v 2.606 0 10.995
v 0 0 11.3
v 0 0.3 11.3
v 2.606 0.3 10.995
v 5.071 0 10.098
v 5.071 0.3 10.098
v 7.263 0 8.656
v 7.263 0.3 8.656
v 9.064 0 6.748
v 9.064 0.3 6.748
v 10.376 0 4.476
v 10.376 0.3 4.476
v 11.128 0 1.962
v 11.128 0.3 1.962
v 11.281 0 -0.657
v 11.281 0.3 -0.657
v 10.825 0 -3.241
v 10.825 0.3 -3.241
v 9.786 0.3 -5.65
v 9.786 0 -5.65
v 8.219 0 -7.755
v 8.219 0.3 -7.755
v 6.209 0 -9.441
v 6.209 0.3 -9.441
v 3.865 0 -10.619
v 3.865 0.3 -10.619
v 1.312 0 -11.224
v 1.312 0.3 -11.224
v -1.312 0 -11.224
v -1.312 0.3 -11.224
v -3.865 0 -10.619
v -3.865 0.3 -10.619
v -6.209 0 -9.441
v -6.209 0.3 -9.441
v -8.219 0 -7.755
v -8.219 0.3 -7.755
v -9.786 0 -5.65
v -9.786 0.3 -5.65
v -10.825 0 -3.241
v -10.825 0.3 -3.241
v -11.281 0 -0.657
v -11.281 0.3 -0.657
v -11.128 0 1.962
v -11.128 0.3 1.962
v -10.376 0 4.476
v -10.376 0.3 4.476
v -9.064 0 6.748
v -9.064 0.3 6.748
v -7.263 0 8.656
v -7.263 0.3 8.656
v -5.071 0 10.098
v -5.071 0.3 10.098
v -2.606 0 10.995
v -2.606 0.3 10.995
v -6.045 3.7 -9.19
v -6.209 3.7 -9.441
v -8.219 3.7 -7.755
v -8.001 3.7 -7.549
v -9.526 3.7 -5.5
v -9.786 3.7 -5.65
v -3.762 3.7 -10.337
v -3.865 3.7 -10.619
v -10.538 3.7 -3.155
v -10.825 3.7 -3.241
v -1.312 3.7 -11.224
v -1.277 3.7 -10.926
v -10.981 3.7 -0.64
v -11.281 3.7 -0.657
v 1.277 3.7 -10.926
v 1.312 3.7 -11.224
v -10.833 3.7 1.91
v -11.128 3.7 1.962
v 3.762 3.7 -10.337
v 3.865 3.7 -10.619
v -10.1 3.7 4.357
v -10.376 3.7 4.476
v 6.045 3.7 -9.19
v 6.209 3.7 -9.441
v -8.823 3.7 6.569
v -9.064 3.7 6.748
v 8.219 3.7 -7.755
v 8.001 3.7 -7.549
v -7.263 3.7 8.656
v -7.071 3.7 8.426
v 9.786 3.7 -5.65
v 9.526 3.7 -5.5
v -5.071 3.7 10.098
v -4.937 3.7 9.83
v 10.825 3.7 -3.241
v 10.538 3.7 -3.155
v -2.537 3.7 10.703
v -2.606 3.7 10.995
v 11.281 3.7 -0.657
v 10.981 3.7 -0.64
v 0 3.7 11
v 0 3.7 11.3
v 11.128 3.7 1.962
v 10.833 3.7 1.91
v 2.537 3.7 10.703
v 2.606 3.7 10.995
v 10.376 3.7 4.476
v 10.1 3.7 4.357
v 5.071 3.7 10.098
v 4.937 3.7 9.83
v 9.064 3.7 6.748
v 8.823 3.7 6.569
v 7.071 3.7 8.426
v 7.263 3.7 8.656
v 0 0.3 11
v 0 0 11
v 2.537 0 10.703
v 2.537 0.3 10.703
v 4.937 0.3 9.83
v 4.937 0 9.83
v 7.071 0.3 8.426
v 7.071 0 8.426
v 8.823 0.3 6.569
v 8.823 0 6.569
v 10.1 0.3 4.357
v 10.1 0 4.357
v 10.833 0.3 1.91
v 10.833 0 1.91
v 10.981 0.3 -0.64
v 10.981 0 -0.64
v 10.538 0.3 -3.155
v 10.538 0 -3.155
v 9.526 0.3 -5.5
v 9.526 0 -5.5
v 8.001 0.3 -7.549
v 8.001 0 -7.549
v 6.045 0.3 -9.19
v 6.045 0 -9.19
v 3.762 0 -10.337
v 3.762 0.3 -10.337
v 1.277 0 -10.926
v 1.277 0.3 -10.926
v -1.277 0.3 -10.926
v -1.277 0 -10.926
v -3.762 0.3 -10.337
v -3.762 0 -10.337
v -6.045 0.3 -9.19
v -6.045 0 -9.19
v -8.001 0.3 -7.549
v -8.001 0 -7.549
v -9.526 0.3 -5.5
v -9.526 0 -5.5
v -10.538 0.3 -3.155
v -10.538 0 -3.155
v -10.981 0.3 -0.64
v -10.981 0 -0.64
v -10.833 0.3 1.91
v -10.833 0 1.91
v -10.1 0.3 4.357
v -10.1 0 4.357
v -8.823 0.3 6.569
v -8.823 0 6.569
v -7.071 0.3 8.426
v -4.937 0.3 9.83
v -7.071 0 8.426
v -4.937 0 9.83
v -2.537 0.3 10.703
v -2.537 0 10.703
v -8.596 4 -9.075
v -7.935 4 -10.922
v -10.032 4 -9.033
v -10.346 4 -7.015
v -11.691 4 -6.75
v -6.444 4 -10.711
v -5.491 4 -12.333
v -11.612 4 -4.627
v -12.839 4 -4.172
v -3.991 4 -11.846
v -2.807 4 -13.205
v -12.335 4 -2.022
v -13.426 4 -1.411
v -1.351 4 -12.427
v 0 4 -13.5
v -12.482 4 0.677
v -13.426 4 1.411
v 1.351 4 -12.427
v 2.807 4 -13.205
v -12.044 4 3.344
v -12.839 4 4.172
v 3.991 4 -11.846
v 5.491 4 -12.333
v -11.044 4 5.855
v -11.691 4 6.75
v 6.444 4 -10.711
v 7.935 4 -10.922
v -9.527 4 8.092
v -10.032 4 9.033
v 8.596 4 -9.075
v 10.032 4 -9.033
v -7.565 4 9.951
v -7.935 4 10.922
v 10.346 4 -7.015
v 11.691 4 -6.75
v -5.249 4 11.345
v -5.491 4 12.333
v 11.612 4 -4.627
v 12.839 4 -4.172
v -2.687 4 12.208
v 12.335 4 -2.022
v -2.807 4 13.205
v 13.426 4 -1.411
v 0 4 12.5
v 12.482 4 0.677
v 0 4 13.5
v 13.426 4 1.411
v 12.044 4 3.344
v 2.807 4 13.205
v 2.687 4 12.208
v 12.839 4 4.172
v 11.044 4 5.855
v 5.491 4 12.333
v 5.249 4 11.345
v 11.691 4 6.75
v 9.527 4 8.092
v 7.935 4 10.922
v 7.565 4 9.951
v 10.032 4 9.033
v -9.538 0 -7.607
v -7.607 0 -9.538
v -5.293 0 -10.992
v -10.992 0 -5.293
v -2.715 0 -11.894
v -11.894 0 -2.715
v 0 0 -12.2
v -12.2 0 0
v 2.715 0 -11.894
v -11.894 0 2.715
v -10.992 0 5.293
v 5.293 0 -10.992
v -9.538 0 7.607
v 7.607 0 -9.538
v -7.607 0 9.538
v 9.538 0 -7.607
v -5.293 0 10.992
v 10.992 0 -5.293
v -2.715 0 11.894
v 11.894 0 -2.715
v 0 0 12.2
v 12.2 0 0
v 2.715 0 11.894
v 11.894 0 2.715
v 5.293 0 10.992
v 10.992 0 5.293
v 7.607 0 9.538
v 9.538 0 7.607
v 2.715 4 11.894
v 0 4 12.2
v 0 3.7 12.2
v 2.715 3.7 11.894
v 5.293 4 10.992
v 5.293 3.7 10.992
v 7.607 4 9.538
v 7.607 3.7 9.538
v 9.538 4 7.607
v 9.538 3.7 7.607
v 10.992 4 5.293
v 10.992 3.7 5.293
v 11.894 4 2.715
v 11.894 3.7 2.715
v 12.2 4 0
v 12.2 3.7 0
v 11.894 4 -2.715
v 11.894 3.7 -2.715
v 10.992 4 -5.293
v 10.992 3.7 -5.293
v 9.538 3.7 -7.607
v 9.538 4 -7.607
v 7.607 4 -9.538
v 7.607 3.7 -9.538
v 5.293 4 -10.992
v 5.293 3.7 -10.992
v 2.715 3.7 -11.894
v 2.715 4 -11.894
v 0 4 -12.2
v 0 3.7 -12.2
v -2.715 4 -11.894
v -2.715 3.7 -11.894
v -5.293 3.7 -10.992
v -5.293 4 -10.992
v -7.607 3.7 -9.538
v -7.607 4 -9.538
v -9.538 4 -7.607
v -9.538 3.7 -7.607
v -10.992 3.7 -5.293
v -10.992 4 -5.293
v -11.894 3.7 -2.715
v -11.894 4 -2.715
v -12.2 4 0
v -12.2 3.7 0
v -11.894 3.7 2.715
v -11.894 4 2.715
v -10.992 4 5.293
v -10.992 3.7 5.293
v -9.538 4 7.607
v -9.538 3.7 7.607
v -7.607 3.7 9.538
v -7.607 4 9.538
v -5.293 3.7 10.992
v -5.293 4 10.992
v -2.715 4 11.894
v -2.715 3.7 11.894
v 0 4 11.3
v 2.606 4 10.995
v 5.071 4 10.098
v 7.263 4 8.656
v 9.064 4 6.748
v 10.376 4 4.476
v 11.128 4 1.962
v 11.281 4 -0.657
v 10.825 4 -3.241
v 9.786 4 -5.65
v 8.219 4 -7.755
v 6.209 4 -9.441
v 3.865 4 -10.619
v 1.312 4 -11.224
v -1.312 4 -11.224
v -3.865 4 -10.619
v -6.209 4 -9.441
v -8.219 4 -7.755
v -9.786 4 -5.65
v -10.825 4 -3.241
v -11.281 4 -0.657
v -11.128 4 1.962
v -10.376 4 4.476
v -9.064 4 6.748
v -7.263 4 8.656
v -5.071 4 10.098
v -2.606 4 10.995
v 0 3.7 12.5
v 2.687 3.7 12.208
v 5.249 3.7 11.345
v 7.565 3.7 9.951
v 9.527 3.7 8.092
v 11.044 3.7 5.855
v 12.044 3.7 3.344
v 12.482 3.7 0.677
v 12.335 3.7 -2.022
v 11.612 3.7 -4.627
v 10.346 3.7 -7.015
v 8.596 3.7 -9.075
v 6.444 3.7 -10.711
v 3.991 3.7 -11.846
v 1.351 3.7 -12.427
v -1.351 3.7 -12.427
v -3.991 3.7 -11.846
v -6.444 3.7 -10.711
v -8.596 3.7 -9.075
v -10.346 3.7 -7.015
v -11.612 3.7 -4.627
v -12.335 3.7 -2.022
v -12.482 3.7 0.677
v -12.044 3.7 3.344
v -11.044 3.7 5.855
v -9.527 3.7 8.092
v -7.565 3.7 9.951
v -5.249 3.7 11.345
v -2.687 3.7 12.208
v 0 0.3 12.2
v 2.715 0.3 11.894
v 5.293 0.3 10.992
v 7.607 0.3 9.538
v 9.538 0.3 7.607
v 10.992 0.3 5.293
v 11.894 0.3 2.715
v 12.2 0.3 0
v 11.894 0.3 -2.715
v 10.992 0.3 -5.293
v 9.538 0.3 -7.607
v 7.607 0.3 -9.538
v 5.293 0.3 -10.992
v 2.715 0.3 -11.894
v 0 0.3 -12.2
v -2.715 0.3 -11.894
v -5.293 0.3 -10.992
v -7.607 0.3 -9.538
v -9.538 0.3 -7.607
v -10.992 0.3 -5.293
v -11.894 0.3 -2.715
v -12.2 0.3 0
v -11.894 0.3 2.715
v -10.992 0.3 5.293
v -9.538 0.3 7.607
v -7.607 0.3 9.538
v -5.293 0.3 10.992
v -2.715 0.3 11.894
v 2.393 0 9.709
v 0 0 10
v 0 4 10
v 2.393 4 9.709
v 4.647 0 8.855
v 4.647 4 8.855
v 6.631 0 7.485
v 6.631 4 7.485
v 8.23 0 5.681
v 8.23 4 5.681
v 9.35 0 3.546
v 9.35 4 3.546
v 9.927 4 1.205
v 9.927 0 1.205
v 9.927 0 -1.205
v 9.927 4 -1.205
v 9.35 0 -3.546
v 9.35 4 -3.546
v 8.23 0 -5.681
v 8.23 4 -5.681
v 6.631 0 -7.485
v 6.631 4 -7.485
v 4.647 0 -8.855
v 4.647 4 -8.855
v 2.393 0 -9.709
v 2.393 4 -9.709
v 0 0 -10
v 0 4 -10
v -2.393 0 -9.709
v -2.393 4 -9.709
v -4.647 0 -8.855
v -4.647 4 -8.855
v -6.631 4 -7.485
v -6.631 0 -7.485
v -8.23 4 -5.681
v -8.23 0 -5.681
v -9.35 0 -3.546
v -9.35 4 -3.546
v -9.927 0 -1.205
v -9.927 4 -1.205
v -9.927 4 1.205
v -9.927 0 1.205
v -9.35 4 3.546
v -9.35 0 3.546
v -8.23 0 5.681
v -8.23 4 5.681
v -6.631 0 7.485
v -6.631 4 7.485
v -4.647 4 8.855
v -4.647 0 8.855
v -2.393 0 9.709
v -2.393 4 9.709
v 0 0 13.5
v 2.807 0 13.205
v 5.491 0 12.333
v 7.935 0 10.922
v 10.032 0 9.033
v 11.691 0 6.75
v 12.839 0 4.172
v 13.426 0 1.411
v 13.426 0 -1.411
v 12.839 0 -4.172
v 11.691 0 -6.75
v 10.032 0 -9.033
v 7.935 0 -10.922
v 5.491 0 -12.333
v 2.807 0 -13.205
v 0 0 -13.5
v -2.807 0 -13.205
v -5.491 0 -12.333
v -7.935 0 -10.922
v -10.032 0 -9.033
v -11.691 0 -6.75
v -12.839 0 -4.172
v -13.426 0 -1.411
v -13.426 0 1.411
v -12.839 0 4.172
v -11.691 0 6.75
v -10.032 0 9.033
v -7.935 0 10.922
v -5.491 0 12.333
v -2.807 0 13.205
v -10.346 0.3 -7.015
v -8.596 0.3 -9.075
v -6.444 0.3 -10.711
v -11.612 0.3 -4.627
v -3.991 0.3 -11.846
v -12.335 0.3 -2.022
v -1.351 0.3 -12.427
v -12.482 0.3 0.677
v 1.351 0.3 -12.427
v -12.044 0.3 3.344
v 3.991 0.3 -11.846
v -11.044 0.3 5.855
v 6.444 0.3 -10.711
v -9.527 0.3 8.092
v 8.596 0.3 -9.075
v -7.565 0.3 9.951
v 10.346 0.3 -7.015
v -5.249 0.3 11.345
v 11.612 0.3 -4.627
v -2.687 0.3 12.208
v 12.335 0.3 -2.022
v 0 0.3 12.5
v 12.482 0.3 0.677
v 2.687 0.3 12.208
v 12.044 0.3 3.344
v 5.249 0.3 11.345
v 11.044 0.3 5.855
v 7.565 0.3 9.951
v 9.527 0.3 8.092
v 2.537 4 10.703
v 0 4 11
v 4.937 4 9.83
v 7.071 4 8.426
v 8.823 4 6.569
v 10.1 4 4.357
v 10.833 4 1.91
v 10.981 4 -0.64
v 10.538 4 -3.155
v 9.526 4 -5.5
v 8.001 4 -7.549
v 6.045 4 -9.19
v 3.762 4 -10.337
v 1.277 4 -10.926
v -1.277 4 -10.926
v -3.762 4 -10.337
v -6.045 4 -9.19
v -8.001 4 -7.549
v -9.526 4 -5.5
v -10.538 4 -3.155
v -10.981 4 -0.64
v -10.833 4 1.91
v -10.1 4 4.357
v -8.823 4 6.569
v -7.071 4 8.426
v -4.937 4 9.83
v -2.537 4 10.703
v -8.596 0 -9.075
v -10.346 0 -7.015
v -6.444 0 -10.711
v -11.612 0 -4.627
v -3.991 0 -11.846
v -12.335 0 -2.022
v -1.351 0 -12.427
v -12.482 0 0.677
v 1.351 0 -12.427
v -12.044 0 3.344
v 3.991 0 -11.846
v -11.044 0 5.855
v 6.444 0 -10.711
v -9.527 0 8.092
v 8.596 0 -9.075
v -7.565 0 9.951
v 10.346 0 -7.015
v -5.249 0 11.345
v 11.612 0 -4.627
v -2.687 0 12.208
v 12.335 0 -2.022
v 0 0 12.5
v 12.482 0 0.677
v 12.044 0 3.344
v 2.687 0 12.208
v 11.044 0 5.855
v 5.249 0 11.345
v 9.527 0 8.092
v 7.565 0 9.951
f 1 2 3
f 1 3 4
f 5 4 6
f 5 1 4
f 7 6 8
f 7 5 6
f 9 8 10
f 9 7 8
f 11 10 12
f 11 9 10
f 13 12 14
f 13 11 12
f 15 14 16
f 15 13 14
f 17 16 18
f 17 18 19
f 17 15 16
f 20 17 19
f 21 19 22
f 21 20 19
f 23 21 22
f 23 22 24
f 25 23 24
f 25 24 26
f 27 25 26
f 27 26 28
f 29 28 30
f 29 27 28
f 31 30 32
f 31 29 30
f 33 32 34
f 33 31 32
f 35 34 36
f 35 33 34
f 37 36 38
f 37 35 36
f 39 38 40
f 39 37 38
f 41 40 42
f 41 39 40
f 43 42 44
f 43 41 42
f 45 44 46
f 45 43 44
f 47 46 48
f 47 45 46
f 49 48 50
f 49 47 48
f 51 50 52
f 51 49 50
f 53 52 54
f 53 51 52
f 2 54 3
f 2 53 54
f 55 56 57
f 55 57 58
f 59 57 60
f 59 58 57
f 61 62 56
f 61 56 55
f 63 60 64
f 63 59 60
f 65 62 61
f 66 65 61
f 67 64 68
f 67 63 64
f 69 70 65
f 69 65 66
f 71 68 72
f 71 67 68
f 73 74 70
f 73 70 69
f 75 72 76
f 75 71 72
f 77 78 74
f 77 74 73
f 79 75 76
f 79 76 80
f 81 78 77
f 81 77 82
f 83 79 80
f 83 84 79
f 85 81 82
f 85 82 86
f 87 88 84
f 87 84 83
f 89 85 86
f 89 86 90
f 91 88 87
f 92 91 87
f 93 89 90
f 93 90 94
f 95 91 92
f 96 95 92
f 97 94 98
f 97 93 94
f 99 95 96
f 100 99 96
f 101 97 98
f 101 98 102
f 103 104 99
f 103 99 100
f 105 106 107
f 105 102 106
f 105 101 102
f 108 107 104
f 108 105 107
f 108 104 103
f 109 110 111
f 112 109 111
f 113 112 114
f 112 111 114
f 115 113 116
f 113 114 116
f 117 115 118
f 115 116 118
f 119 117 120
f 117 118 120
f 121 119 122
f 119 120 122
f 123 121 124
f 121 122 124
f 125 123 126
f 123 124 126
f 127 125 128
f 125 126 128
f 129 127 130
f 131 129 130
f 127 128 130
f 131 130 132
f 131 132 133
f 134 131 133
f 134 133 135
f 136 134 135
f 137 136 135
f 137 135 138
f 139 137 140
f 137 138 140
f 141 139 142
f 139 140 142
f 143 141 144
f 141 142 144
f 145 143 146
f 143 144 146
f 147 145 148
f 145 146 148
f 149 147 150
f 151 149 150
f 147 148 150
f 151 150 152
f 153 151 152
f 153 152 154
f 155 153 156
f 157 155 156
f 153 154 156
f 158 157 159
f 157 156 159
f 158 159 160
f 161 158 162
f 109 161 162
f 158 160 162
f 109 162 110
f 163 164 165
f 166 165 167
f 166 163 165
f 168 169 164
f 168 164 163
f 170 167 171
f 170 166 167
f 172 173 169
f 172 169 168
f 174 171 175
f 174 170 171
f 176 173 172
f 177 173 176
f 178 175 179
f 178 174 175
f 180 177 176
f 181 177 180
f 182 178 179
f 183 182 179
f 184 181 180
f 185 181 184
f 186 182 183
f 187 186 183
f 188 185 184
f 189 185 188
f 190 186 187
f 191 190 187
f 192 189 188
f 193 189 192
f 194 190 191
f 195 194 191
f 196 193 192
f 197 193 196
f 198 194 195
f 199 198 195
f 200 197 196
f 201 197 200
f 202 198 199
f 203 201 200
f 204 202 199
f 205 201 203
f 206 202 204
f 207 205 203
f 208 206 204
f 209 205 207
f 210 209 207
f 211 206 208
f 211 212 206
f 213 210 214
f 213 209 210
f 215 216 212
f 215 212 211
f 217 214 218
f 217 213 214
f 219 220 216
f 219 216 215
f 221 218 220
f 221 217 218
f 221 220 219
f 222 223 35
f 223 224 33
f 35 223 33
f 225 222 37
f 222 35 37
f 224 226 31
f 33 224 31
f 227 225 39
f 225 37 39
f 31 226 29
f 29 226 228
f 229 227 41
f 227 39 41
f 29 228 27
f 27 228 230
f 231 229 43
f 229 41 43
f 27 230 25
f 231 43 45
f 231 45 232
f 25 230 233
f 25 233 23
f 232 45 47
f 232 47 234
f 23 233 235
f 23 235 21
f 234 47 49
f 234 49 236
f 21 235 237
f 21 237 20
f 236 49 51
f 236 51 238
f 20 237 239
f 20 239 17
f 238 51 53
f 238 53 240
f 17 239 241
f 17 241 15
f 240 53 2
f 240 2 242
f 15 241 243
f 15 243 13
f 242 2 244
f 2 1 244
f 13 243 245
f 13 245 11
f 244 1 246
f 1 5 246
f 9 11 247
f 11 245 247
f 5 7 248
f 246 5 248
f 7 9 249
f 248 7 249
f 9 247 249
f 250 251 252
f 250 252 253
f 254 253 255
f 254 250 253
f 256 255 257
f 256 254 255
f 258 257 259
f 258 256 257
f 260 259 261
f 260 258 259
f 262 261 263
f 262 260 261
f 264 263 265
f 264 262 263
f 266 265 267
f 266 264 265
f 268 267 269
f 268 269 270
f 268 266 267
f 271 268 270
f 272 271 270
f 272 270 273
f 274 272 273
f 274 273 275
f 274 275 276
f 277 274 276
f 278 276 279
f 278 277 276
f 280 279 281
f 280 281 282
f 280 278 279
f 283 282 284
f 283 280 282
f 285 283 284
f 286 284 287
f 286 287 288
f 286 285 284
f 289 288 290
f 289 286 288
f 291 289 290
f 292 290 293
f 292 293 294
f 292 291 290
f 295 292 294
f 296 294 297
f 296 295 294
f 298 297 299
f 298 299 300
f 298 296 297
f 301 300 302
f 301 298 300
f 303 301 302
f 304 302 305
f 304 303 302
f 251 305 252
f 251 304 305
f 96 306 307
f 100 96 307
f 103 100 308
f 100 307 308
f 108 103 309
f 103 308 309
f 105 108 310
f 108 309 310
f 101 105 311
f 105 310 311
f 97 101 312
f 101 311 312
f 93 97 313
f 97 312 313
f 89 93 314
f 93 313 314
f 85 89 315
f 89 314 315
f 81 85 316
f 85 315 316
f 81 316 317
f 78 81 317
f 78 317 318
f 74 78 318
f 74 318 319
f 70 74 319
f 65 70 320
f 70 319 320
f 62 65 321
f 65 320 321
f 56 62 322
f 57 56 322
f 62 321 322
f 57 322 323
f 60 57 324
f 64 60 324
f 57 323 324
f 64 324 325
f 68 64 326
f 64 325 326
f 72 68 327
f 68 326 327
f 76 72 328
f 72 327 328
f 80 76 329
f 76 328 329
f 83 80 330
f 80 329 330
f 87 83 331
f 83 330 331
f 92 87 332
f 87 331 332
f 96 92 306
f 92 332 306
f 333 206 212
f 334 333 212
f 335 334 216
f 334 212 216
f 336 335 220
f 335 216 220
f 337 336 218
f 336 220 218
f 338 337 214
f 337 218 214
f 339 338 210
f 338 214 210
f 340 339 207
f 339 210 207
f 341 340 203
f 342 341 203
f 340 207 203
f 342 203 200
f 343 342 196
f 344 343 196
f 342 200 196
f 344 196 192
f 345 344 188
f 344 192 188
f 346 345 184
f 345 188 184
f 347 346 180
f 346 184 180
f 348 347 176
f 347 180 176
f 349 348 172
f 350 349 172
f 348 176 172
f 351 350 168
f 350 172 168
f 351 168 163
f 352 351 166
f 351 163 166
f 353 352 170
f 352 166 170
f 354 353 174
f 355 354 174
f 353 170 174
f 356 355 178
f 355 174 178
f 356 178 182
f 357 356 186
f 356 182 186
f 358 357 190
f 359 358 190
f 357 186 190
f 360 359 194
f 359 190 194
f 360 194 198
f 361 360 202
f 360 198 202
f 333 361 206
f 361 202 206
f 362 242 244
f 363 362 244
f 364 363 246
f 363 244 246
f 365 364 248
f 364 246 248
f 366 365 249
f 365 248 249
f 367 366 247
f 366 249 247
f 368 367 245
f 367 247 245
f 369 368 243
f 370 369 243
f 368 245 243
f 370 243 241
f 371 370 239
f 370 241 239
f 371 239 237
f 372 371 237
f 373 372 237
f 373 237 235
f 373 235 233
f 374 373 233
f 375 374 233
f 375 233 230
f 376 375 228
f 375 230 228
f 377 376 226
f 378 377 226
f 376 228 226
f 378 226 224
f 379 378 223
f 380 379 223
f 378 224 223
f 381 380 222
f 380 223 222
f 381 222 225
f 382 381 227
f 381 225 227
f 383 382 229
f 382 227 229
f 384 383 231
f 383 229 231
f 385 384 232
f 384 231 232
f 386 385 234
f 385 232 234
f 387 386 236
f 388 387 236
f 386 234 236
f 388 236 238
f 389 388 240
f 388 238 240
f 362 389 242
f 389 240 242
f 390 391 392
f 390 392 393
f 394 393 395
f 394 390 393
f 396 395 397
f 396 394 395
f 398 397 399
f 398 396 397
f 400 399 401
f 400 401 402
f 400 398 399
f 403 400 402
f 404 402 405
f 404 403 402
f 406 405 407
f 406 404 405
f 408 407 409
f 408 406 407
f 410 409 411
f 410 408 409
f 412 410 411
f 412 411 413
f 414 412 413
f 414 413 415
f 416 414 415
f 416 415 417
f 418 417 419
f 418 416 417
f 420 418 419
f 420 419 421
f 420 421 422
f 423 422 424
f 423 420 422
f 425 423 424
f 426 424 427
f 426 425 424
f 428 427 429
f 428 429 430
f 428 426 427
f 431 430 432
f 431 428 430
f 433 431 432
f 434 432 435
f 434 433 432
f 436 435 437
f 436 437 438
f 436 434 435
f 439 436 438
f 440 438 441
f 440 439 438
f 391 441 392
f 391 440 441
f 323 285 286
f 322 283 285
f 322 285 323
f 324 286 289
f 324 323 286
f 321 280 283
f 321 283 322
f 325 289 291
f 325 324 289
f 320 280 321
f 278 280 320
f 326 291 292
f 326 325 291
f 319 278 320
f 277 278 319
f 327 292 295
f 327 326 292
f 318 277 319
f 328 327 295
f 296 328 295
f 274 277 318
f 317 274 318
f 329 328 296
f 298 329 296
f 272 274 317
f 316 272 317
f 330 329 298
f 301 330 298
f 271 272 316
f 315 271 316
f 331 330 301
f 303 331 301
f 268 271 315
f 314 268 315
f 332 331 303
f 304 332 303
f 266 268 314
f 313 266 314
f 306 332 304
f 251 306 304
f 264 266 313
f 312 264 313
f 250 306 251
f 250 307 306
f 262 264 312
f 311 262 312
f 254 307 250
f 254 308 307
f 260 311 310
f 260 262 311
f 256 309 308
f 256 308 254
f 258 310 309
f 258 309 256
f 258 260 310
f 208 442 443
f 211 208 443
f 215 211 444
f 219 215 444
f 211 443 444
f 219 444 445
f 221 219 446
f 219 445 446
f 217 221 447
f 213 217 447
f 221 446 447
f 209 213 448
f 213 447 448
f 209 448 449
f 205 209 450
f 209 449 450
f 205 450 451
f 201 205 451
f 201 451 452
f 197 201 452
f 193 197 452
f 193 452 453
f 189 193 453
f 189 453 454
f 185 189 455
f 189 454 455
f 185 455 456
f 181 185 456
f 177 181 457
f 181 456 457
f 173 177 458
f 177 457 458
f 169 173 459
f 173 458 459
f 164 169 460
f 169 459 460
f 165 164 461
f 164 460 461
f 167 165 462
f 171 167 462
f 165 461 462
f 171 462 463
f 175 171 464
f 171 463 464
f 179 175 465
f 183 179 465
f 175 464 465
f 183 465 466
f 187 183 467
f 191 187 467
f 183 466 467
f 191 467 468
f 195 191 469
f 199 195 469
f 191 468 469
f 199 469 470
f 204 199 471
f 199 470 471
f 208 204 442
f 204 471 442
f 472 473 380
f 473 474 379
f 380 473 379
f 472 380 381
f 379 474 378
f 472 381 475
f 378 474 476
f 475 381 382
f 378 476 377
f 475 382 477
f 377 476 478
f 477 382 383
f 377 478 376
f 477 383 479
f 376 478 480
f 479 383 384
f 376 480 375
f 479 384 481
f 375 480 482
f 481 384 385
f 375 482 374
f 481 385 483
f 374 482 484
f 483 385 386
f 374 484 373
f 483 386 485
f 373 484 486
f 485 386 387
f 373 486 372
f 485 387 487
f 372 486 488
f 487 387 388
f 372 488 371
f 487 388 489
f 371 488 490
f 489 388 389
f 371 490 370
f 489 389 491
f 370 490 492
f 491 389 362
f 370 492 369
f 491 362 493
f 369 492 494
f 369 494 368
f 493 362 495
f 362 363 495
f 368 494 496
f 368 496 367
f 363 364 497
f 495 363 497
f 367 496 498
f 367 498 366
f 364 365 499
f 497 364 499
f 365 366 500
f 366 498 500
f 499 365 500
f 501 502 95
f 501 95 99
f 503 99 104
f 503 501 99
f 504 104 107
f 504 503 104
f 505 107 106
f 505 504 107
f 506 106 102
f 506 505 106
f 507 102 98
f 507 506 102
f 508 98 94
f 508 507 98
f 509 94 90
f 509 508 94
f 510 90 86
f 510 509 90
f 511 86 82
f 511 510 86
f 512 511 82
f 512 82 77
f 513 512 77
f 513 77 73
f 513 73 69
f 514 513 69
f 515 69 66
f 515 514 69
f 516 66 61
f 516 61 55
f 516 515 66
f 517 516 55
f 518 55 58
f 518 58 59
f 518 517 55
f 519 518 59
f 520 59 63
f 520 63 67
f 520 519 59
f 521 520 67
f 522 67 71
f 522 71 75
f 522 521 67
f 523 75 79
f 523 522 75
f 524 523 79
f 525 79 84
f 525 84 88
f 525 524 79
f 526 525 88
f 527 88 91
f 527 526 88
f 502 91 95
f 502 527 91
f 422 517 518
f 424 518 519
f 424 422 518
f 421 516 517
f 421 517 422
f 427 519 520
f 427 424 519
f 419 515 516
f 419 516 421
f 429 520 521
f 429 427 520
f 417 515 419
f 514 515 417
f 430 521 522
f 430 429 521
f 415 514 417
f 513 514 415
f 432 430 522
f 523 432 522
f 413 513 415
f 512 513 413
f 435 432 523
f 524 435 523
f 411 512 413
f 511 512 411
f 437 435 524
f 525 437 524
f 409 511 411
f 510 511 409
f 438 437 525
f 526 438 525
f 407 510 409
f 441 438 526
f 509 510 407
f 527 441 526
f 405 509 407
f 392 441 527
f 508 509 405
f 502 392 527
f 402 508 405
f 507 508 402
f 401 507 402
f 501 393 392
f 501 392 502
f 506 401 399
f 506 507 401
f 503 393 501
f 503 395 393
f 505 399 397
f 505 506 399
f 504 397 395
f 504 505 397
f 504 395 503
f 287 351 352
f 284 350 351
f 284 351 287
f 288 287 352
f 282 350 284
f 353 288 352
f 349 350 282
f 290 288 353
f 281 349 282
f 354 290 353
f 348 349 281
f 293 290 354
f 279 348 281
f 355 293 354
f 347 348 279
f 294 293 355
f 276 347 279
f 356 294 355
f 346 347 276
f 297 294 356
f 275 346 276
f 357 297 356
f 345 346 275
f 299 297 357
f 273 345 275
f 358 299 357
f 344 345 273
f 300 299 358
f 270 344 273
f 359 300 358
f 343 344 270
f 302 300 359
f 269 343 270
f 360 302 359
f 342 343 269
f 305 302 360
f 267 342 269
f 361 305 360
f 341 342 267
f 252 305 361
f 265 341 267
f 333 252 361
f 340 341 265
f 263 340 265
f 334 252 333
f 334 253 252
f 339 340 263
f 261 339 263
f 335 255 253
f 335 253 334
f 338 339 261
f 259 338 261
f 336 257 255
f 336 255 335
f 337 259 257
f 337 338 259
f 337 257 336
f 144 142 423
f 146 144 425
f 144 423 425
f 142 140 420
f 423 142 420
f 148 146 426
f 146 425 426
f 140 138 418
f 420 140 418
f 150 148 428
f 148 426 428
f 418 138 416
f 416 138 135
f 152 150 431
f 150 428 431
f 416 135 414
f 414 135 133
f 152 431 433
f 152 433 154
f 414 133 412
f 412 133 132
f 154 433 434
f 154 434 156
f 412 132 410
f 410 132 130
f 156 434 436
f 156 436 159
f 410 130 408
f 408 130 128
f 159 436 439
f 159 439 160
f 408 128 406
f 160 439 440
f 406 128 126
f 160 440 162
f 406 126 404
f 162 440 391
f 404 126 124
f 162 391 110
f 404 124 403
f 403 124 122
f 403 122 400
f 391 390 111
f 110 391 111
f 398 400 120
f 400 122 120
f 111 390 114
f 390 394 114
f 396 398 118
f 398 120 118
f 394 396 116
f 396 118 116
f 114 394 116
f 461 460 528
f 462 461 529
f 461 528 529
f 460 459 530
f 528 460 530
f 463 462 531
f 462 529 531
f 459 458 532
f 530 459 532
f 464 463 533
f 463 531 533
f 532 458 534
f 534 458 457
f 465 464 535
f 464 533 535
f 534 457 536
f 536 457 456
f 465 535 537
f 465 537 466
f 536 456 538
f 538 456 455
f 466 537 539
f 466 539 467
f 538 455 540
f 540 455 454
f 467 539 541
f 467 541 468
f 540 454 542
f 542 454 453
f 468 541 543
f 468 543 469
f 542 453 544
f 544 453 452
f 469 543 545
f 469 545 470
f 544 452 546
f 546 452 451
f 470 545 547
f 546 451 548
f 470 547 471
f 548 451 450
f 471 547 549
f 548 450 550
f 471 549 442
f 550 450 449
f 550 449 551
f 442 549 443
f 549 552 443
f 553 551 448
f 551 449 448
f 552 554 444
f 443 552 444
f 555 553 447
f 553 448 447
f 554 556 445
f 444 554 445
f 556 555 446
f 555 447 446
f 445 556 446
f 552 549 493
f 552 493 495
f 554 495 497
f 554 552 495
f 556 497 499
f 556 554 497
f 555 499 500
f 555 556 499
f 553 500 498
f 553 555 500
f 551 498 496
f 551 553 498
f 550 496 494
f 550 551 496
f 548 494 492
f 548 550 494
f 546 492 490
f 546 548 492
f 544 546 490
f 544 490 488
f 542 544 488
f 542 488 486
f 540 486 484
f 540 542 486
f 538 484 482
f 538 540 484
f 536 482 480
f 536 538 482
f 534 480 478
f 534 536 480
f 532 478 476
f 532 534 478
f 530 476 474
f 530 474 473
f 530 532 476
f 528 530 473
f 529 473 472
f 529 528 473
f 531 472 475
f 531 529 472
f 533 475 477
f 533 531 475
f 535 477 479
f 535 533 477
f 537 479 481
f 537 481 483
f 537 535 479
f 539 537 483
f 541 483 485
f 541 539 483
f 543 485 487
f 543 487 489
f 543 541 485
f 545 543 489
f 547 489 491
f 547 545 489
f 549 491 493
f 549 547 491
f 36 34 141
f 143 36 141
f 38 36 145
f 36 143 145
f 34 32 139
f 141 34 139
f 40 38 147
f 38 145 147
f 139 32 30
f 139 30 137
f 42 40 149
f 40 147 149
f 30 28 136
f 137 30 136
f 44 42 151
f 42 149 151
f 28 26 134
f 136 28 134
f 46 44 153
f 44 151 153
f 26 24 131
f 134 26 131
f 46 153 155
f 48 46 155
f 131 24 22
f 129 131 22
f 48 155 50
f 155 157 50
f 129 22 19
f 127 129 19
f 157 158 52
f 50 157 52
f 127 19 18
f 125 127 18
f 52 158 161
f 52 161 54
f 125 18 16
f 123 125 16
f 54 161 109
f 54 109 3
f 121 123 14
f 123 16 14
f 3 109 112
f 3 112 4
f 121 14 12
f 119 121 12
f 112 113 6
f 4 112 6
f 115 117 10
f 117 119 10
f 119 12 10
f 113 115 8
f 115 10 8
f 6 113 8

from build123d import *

# Parameters (mm, degrees)
SKETCH_1_R          = 13.5
SKETCH_1_R_2        = 10
EXTRUDE_1_DEPTH     = 4
SKETCH_2_R          = 12.5
SKETCH_2_R_2        = 12.2
SKETCH_2_R_3        = 11.3
SKETCH_2_R_4        = 11
CUT_EXTRUDE_1_DEPTH = 0.3


with BuildPart() as part:
    # 草图1 → 凸台-拉伸1 (new body)
    with BuildSketch(Plane(origin=(0, 0, 0), x_dir=(1, 0, 0), z_dir=(0, 1, 0))):
        with Locations(Location((0, 0, 0), (0, 0, 270))):
            Circle(SKETCH_1_R)
        with Locations(Location((0, 0, 0), (0, 0, 270))):
            Circle(SKETCH_1_R_2, mode=Mode.SUBTRACT)
    extrude(amount=EXTRUDE_1_DEPTH)

    # 草图2 → 切除-拉伸1 (cut)
    # profile 1 of 2: a face of its own
    with BuildSketch(Plane(origin=(0, 4, 0), x_dir=(1, 0, 0), z_dir=(0, 1, 0))):
        with Locations(Location((0, 0, 0), (0, 0, 270))):
            Circle(SKETCH_2_R)
        with Locations(Location((0, 0, 0), (0, 0, 270))):
            Circle(SKETCH_2_R_2, mode=Mode.SUBTRACT)
    # profile 2 of 2: a face of its own
    with BuildSketch(Plane(origin=(0, 4, 0), x_dir=(1, 0, 0), z_dir=(0, 1, 0))):
        with Locations(Location((0, 0, 0), (0, 0, 270))):
            Circle(SKETCH_2_R_3)
        with Locations(Location((0, 0, 0), (0, 0, 270))):
            Circle(SKETCH_2_R_4, mode=Mode.SUBTRACT)
    cut_extrude_1 = extrude(amount=-CUT_EXTRUDE_1_DEPTH, mode=Mode.SUBTRACT)

    # 镜向1: 切除-拉伸1 across plane
    add(cut_extrude_1.mirror(Plane.ZX.offset(2)), mode=Mode.SUBTRACT)


solid = part.part
